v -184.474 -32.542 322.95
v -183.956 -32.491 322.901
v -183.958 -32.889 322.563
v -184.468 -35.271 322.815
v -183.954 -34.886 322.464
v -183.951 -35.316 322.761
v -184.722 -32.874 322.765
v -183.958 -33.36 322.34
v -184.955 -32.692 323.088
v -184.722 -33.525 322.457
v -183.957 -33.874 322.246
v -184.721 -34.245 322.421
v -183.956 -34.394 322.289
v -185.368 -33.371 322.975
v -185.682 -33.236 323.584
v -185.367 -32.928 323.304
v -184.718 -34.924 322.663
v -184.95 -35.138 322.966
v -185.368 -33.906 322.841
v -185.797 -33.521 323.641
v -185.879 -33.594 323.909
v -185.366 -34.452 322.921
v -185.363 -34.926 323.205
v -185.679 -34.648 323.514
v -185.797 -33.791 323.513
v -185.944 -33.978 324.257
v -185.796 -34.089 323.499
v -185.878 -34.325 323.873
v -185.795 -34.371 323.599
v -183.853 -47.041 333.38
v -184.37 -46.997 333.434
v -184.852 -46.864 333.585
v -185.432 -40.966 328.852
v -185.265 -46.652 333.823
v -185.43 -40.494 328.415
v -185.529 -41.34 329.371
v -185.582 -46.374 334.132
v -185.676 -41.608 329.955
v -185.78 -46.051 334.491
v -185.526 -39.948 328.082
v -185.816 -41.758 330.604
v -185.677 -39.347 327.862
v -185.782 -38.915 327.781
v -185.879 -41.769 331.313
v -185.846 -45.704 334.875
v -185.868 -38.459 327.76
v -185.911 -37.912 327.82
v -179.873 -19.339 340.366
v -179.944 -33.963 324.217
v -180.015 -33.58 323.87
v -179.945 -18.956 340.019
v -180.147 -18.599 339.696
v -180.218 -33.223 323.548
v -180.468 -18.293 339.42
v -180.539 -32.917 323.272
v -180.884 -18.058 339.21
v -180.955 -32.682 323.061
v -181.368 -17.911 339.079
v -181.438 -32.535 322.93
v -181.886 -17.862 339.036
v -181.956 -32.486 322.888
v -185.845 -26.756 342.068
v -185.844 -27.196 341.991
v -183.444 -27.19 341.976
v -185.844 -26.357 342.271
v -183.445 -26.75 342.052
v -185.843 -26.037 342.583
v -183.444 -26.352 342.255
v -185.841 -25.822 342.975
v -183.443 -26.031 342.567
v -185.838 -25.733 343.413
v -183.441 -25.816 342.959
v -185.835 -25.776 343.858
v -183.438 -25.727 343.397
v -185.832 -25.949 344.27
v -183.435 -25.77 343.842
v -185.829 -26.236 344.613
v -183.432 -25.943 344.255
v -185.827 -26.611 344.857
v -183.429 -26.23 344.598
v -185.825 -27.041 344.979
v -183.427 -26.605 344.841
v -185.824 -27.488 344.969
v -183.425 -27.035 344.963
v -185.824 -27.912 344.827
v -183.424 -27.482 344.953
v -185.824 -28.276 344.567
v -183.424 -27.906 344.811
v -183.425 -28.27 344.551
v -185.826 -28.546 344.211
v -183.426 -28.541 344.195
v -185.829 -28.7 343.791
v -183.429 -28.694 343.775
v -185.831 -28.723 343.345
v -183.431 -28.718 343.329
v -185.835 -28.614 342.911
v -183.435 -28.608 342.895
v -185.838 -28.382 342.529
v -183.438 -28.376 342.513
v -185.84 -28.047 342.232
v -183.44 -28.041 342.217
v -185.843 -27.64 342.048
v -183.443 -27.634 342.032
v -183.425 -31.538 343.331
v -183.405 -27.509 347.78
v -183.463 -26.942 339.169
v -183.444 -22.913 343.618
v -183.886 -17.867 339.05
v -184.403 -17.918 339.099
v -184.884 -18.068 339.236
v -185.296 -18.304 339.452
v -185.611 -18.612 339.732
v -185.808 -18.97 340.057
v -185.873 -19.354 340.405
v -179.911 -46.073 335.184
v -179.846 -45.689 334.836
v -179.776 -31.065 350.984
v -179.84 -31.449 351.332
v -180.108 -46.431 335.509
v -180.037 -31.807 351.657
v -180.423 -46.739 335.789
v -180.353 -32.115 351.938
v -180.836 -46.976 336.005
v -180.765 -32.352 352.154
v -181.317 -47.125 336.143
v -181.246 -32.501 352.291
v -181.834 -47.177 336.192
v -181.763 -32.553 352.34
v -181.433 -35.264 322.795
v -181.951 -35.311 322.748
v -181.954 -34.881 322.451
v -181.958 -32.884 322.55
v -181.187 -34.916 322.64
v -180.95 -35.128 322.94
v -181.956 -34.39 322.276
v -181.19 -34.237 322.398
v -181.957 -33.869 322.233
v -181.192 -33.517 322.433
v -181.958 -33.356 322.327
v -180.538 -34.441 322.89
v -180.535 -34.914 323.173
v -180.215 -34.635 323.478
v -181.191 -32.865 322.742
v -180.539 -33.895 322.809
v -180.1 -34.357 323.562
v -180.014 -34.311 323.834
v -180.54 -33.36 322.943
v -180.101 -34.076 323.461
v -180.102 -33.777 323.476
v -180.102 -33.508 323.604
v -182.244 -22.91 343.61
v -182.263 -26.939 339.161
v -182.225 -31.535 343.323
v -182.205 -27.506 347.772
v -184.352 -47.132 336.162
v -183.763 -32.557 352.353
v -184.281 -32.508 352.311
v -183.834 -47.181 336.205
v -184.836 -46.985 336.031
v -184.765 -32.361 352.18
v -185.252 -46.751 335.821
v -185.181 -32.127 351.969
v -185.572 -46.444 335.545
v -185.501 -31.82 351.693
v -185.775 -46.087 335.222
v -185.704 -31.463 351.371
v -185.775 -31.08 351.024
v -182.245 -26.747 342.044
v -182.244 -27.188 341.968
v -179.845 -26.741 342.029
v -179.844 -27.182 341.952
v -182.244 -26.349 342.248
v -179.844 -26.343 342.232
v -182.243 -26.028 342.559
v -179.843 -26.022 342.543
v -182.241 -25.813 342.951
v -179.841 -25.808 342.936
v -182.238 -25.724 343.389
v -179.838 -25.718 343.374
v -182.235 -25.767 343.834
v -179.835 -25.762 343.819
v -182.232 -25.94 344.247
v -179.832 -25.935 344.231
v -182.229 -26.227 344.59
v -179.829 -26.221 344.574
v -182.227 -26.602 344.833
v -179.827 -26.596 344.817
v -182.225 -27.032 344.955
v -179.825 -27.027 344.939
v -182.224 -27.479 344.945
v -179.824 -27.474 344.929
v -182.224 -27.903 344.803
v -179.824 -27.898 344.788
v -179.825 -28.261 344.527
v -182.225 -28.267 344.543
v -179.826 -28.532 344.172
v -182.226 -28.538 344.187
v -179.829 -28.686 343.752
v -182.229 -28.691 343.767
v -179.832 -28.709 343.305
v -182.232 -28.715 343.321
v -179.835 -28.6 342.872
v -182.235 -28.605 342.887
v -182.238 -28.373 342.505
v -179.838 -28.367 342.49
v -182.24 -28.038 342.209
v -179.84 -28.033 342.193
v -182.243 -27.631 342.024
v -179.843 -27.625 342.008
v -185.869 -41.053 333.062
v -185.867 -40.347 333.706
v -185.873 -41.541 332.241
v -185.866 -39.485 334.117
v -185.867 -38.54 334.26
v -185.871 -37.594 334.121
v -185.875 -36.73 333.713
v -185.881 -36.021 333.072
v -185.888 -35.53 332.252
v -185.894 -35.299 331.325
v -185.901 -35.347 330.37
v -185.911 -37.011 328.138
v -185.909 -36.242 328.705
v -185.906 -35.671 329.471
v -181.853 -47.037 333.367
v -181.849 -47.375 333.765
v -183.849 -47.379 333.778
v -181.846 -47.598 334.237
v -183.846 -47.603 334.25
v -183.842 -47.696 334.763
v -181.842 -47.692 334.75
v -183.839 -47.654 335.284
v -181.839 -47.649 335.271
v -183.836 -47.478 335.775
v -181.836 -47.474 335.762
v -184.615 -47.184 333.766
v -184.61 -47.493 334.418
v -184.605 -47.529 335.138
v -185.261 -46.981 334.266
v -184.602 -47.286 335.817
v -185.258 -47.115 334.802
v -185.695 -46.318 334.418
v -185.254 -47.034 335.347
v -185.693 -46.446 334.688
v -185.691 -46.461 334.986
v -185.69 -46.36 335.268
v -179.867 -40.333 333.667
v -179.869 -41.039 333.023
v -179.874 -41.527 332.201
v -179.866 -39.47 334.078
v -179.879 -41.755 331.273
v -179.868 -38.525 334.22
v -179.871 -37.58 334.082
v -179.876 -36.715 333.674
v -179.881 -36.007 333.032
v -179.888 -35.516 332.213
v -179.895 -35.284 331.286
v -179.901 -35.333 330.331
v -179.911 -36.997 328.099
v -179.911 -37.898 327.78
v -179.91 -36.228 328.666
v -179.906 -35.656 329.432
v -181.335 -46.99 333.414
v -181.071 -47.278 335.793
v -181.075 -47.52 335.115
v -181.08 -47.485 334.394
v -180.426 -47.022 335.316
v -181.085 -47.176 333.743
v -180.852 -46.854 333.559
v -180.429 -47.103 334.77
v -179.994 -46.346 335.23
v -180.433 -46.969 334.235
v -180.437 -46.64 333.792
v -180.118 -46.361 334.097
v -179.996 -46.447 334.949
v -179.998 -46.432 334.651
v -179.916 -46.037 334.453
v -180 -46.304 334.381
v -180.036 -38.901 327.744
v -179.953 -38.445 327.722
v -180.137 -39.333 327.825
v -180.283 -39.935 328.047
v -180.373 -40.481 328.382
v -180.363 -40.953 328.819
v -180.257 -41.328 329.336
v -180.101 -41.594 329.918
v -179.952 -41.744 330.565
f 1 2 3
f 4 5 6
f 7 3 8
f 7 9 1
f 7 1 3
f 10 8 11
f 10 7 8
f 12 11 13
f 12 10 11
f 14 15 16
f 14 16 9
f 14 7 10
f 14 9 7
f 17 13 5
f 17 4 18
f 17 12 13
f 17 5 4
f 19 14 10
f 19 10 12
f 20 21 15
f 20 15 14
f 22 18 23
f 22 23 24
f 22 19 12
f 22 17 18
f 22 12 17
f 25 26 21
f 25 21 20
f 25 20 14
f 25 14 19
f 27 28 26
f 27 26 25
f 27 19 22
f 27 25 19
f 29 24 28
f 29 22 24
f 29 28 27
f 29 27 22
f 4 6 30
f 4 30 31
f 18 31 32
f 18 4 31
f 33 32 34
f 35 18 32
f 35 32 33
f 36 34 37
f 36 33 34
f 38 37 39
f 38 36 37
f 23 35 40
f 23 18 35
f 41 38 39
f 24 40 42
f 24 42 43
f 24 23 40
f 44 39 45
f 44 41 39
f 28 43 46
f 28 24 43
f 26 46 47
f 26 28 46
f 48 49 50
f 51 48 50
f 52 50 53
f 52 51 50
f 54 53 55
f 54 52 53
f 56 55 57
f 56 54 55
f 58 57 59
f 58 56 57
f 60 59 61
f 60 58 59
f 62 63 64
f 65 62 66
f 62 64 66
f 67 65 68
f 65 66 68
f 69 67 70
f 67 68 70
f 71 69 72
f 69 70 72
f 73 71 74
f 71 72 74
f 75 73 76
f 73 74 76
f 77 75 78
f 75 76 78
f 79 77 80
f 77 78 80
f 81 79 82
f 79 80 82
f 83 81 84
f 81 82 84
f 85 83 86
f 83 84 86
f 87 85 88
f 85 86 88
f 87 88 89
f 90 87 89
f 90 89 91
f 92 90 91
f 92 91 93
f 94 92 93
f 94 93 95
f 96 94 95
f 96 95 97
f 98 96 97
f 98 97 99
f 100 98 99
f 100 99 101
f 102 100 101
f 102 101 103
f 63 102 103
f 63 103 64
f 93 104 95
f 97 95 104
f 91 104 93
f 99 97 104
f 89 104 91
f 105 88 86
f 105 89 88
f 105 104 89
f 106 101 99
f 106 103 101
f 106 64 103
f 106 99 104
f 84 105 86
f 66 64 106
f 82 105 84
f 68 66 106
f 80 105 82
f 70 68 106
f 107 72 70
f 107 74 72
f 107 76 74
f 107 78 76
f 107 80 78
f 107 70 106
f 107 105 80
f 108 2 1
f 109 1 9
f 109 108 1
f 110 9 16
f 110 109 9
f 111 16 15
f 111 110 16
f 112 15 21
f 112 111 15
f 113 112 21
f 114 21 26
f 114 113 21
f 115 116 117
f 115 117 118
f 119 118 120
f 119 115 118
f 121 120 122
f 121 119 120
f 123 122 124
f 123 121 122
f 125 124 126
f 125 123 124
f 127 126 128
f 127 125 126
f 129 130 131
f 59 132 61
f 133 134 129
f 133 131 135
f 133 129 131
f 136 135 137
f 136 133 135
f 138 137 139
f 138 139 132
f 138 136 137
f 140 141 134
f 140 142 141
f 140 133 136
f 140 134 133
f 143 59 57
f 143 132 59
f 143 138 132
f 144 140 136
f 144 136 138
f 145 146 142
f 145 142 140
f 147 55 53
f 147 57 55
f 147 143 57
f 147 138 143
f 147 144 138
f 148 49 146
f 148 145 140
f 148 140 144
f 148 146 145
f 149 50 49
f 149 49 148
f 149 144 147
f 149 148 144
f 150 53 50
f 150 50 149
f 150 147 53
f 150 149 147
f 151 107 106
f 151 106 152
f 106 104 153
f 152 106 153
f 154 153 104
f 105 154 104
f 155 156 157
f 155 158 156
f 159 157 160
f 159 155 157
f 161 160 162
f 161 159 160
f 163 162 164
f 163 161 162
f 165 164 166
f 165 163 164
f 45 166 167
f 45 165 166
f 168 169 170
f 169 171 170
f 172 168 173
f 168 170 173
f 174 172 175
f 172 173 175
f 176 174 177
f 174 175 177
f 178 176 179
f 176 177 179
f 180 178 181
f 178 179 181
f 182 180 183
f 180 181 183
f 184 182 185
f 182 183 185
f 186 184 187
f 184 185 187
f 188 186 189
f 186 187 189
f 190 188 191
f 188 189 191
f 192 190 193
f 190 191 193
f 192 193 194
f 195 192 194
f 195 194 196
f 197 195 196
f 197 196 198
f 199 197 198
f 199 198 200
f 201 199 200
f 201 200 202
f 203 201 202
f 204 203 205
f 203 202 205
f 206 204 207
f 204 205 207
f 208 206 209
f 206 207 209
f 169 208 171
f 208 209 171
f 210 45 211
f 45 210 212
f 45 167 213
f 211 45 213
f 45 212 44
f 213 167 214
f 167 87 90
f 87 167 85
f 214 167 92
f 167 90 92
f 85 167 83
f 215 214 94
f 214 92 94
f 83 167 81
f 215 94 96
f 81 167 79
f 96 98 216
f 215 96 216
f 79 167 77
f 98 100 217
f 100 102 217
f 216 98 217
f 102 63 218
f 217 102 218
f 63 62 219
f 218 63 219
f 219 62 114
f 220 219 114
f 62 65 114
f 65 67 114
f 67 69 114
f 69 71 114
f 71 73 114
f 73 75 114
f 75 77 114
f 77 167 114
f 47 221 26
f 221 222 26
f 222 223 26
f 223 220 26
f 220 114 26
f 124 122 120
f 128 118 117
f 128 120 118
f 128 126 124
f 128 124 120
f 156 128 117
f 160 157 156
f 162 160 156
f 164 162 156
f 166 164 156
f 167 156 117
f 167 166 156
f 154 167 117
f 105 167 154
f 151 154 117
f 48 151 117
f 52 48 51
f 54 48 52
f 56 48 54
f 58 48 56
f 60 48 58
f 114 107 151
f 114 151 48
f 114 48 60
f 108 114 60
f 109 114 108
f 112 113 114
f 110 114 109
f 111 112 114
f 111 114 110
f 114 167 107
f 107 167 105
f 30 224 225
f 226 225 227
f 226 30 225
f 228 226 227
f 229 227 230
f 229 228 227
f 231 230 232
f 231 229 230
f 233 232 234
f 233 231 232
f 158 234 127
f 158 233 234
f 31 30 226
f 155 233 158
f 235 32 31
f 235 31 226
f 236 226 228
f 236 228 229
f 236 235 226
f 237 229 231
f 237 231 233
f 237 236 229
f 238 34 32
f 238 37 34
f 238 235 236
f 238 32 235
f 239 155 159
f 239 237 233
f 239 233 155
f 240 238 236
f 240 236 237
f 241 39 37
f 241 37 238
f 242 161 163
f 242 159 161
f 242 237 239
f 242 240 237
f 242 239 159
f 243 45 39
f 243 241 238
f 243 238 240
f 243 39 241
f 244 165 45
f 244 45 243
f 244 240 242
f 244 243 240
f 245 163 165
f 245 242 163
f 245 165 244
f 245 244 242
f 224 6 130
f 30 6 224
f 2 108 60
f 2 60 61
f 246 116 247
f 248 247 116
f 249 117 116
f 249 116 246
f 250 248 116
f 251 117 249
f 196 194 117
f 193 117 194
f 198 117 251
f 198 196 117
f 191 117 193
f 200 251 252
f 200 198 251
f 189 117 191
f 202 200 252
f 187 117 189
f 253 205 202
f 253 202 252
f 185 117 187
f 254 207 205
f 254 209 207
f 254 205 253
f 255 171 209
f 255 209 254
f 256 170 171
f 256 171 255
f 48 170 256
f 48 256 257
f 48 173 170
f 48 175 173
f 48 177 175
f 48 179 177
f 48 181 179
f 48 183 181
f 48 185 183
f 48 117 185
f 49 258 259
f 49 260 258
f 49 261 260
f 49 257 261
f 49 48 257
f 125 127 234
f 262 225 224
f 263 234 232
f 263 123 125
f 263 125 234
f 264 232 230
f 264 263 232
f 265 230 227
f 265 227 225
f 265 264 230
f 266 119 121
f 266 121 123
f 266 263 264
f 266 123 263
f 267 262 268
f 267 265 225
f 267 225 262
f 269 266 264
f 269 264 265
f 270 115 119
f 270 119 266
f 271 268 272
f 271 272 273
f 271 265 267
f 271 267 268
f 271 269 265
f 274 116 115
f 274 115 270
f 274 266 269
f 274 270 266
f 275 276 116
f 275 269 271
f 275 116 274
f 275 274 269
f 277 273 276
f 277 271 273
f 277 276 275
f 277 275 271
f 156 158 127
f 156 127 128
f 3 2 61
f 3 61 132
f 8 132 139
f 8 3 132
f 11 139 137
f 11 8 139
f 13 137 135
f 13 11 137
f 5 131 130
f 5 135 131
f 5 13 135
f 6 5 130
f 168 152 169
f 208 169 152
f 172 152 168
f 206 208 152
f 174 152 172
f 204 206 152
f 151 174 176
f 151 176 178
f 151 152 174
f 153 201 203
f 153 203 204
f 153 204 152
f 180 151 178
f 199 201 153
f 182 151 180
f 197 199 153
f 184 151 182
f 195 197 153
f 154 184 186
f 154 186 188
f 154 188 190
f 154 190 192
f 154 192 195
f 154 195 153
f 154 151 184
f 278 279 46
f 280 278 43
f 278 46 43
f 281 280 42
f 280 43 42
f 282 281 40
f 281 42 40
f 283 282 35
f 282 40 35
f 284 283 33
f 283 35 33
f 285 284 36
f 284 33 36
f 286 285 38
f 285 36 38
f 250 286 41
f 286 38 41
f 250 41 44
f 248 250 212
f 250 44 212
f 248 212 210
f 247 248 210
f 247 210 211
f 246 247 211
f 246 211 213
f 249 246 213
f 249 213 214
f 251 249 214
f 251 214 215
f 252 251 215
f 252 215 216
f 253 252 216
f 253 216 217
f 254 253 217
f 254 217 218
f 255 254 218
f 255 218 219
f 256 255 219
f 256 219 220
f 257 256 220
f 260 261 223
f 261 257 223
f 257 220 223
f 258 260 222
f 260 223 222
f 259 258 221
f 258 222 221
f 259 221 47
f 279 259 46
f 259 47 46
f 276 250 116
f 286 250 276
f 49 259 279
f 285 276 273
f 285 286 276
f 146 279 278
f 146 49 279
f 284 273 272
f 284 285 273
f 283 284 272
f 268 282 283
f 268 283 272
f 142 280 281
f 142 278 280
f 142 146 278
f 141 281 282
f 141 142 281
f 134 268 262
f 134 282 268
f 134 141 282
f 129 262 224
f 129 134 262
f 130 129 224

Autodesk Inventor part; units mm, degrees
ref_plane "YZ Plane" through (0, 0, 0) normal (1, 0, 0) x (0, 1, 0)
ref_plane "XZ Plane" through (0, 0, 0) normal (0, 1, 0) x (-1, 0, 0)
ref_plane "XY Plane" through (0, 0, 0) normal (0, 0, 1) x (1, 0, 0)
ref_plane "РабПлоскость1" through (-185.8888, -38.5334, 331.0061) normal (0.9999756, 0.0023998, -0.0065586) x (-0.0066118, 0.0228778, -0.9997164)
sketch "Эскиз9" plane through (-185.8888, -38.5334, 331.0061) normal (0.9999756, 0.0023998, -0.0065586) x (-0.0066118, 0.0228778, -0.9997164)
  circle A0 centre (-0.0036, 0) radius 3.25 projected
  line L0 (7.5744, -20.841) -> (-21.2183, 6.4584)
  line L1 (-21.2183, 6.4584) -> (-7.5816, 20.841)
  line L2 (-7.5816, 20.841) -> (21.2112, -6.4584)
  line L3 (21.2112, -6.4584) -> (7.5744, -20.841)
  line L4 (7.5744, -20.841) -> (-7.5816, 20.841) construction
  line L5 (-21.2183, 6.4584) -> (21.2112, -6.4584) construction
  line L6 (9.6794, 4.4753) -> (-3.9573, -9.9074)
  point P0 (330.5647, 30.5274)
extrude "Выдавливание4" add sketch "Эскиз9" along normal blind 6 contours L0 L1 L2 L6
fillet "Сопряжение2" radius 2 8 edges at (-182.8404, -48.5216, 334.7158) (-179.8019, -40.5311, 343.5115) (-185.8017, -40.5455, 343.5509) (-182.963, -33.8307, 321.4122) (-179.9244, -25.8402, 330.2079) (-185.9242, -25.8546, 330.2473) (-185.9016, -41.1833, 328.0837) (-179.9018, -41.1689, 328.0443)
sketch "Эскиз11" plane through (-185.7754, -31.0798, 351.0238) normal (0.0032506, 0.6712535, 0.7412207) x (0.9999756, 0.0023998, -0.0065586)
  line L0 (0, 17.8197) -> (6, -2)
  line L1 (6, 17.8197) -> (0, -2)
  line L2 (2.4, 11.0099) -> (3.6, 11.0099)
  line L3 (3.6, 11.0099) -> (3.6, 4.8099)
  line L4 (3.6, 4.8099) -> (2.4, 4.8099)
  line L5 (2.4, 4.8099) -> (2.4, 11.0099)
  line L6 (2.4, 11.0099) -> (3.6, 4.8099) construction
  line L7 (3.6, 11.0099) -> (2.4, 4.8099) construction
  point P0 (188.1477, 257.5062)
  point P1 (3, 7.9099)
  dimension "d31" = 1.2
  dimension "d32" = 6.2
extrude "Выдавливание6" cut sketch "Эскиз11" against normal blind 6
sketch "Эскиз12" plane through (-179.889, -38.519, 330.9668) normal (0.9999756, 0.0023998, -0.0065586) x (-0.0066118, 0.0228778, -0.9997164)
  line L0 (-16.5329, 11.4001) -> (-12.267, 15.8993) projected
  line L1 (-16.5329, 11.4001) -> (-12.1788, 7.2719) projected
  line L2 (-12.1788, 7.2719) -> (-7.913, 11.7711) projected
  line L3 (-12.267, 15.8993) -> (-7.913, 11.7711) projected
  line L4 (-12.1788, 7.2719) -> (-12.267, 15.8993)
  line L5 (-16.5329, 11.4001) -> (-7.913, 11.7711)
  circle A0 centre (-12.2229, 11.5856) radius 1.5
  point P0 (330.5647, 30.5274)
  dimension "d35" = 3
extrude "Выдавливание7" cut sketch "Эскиз12" against normal blind 6 contours A0 L4 L5 | L5 L4 A0 | A0 L5 L4 | L4 L5 A0
properties part number "хвост"
